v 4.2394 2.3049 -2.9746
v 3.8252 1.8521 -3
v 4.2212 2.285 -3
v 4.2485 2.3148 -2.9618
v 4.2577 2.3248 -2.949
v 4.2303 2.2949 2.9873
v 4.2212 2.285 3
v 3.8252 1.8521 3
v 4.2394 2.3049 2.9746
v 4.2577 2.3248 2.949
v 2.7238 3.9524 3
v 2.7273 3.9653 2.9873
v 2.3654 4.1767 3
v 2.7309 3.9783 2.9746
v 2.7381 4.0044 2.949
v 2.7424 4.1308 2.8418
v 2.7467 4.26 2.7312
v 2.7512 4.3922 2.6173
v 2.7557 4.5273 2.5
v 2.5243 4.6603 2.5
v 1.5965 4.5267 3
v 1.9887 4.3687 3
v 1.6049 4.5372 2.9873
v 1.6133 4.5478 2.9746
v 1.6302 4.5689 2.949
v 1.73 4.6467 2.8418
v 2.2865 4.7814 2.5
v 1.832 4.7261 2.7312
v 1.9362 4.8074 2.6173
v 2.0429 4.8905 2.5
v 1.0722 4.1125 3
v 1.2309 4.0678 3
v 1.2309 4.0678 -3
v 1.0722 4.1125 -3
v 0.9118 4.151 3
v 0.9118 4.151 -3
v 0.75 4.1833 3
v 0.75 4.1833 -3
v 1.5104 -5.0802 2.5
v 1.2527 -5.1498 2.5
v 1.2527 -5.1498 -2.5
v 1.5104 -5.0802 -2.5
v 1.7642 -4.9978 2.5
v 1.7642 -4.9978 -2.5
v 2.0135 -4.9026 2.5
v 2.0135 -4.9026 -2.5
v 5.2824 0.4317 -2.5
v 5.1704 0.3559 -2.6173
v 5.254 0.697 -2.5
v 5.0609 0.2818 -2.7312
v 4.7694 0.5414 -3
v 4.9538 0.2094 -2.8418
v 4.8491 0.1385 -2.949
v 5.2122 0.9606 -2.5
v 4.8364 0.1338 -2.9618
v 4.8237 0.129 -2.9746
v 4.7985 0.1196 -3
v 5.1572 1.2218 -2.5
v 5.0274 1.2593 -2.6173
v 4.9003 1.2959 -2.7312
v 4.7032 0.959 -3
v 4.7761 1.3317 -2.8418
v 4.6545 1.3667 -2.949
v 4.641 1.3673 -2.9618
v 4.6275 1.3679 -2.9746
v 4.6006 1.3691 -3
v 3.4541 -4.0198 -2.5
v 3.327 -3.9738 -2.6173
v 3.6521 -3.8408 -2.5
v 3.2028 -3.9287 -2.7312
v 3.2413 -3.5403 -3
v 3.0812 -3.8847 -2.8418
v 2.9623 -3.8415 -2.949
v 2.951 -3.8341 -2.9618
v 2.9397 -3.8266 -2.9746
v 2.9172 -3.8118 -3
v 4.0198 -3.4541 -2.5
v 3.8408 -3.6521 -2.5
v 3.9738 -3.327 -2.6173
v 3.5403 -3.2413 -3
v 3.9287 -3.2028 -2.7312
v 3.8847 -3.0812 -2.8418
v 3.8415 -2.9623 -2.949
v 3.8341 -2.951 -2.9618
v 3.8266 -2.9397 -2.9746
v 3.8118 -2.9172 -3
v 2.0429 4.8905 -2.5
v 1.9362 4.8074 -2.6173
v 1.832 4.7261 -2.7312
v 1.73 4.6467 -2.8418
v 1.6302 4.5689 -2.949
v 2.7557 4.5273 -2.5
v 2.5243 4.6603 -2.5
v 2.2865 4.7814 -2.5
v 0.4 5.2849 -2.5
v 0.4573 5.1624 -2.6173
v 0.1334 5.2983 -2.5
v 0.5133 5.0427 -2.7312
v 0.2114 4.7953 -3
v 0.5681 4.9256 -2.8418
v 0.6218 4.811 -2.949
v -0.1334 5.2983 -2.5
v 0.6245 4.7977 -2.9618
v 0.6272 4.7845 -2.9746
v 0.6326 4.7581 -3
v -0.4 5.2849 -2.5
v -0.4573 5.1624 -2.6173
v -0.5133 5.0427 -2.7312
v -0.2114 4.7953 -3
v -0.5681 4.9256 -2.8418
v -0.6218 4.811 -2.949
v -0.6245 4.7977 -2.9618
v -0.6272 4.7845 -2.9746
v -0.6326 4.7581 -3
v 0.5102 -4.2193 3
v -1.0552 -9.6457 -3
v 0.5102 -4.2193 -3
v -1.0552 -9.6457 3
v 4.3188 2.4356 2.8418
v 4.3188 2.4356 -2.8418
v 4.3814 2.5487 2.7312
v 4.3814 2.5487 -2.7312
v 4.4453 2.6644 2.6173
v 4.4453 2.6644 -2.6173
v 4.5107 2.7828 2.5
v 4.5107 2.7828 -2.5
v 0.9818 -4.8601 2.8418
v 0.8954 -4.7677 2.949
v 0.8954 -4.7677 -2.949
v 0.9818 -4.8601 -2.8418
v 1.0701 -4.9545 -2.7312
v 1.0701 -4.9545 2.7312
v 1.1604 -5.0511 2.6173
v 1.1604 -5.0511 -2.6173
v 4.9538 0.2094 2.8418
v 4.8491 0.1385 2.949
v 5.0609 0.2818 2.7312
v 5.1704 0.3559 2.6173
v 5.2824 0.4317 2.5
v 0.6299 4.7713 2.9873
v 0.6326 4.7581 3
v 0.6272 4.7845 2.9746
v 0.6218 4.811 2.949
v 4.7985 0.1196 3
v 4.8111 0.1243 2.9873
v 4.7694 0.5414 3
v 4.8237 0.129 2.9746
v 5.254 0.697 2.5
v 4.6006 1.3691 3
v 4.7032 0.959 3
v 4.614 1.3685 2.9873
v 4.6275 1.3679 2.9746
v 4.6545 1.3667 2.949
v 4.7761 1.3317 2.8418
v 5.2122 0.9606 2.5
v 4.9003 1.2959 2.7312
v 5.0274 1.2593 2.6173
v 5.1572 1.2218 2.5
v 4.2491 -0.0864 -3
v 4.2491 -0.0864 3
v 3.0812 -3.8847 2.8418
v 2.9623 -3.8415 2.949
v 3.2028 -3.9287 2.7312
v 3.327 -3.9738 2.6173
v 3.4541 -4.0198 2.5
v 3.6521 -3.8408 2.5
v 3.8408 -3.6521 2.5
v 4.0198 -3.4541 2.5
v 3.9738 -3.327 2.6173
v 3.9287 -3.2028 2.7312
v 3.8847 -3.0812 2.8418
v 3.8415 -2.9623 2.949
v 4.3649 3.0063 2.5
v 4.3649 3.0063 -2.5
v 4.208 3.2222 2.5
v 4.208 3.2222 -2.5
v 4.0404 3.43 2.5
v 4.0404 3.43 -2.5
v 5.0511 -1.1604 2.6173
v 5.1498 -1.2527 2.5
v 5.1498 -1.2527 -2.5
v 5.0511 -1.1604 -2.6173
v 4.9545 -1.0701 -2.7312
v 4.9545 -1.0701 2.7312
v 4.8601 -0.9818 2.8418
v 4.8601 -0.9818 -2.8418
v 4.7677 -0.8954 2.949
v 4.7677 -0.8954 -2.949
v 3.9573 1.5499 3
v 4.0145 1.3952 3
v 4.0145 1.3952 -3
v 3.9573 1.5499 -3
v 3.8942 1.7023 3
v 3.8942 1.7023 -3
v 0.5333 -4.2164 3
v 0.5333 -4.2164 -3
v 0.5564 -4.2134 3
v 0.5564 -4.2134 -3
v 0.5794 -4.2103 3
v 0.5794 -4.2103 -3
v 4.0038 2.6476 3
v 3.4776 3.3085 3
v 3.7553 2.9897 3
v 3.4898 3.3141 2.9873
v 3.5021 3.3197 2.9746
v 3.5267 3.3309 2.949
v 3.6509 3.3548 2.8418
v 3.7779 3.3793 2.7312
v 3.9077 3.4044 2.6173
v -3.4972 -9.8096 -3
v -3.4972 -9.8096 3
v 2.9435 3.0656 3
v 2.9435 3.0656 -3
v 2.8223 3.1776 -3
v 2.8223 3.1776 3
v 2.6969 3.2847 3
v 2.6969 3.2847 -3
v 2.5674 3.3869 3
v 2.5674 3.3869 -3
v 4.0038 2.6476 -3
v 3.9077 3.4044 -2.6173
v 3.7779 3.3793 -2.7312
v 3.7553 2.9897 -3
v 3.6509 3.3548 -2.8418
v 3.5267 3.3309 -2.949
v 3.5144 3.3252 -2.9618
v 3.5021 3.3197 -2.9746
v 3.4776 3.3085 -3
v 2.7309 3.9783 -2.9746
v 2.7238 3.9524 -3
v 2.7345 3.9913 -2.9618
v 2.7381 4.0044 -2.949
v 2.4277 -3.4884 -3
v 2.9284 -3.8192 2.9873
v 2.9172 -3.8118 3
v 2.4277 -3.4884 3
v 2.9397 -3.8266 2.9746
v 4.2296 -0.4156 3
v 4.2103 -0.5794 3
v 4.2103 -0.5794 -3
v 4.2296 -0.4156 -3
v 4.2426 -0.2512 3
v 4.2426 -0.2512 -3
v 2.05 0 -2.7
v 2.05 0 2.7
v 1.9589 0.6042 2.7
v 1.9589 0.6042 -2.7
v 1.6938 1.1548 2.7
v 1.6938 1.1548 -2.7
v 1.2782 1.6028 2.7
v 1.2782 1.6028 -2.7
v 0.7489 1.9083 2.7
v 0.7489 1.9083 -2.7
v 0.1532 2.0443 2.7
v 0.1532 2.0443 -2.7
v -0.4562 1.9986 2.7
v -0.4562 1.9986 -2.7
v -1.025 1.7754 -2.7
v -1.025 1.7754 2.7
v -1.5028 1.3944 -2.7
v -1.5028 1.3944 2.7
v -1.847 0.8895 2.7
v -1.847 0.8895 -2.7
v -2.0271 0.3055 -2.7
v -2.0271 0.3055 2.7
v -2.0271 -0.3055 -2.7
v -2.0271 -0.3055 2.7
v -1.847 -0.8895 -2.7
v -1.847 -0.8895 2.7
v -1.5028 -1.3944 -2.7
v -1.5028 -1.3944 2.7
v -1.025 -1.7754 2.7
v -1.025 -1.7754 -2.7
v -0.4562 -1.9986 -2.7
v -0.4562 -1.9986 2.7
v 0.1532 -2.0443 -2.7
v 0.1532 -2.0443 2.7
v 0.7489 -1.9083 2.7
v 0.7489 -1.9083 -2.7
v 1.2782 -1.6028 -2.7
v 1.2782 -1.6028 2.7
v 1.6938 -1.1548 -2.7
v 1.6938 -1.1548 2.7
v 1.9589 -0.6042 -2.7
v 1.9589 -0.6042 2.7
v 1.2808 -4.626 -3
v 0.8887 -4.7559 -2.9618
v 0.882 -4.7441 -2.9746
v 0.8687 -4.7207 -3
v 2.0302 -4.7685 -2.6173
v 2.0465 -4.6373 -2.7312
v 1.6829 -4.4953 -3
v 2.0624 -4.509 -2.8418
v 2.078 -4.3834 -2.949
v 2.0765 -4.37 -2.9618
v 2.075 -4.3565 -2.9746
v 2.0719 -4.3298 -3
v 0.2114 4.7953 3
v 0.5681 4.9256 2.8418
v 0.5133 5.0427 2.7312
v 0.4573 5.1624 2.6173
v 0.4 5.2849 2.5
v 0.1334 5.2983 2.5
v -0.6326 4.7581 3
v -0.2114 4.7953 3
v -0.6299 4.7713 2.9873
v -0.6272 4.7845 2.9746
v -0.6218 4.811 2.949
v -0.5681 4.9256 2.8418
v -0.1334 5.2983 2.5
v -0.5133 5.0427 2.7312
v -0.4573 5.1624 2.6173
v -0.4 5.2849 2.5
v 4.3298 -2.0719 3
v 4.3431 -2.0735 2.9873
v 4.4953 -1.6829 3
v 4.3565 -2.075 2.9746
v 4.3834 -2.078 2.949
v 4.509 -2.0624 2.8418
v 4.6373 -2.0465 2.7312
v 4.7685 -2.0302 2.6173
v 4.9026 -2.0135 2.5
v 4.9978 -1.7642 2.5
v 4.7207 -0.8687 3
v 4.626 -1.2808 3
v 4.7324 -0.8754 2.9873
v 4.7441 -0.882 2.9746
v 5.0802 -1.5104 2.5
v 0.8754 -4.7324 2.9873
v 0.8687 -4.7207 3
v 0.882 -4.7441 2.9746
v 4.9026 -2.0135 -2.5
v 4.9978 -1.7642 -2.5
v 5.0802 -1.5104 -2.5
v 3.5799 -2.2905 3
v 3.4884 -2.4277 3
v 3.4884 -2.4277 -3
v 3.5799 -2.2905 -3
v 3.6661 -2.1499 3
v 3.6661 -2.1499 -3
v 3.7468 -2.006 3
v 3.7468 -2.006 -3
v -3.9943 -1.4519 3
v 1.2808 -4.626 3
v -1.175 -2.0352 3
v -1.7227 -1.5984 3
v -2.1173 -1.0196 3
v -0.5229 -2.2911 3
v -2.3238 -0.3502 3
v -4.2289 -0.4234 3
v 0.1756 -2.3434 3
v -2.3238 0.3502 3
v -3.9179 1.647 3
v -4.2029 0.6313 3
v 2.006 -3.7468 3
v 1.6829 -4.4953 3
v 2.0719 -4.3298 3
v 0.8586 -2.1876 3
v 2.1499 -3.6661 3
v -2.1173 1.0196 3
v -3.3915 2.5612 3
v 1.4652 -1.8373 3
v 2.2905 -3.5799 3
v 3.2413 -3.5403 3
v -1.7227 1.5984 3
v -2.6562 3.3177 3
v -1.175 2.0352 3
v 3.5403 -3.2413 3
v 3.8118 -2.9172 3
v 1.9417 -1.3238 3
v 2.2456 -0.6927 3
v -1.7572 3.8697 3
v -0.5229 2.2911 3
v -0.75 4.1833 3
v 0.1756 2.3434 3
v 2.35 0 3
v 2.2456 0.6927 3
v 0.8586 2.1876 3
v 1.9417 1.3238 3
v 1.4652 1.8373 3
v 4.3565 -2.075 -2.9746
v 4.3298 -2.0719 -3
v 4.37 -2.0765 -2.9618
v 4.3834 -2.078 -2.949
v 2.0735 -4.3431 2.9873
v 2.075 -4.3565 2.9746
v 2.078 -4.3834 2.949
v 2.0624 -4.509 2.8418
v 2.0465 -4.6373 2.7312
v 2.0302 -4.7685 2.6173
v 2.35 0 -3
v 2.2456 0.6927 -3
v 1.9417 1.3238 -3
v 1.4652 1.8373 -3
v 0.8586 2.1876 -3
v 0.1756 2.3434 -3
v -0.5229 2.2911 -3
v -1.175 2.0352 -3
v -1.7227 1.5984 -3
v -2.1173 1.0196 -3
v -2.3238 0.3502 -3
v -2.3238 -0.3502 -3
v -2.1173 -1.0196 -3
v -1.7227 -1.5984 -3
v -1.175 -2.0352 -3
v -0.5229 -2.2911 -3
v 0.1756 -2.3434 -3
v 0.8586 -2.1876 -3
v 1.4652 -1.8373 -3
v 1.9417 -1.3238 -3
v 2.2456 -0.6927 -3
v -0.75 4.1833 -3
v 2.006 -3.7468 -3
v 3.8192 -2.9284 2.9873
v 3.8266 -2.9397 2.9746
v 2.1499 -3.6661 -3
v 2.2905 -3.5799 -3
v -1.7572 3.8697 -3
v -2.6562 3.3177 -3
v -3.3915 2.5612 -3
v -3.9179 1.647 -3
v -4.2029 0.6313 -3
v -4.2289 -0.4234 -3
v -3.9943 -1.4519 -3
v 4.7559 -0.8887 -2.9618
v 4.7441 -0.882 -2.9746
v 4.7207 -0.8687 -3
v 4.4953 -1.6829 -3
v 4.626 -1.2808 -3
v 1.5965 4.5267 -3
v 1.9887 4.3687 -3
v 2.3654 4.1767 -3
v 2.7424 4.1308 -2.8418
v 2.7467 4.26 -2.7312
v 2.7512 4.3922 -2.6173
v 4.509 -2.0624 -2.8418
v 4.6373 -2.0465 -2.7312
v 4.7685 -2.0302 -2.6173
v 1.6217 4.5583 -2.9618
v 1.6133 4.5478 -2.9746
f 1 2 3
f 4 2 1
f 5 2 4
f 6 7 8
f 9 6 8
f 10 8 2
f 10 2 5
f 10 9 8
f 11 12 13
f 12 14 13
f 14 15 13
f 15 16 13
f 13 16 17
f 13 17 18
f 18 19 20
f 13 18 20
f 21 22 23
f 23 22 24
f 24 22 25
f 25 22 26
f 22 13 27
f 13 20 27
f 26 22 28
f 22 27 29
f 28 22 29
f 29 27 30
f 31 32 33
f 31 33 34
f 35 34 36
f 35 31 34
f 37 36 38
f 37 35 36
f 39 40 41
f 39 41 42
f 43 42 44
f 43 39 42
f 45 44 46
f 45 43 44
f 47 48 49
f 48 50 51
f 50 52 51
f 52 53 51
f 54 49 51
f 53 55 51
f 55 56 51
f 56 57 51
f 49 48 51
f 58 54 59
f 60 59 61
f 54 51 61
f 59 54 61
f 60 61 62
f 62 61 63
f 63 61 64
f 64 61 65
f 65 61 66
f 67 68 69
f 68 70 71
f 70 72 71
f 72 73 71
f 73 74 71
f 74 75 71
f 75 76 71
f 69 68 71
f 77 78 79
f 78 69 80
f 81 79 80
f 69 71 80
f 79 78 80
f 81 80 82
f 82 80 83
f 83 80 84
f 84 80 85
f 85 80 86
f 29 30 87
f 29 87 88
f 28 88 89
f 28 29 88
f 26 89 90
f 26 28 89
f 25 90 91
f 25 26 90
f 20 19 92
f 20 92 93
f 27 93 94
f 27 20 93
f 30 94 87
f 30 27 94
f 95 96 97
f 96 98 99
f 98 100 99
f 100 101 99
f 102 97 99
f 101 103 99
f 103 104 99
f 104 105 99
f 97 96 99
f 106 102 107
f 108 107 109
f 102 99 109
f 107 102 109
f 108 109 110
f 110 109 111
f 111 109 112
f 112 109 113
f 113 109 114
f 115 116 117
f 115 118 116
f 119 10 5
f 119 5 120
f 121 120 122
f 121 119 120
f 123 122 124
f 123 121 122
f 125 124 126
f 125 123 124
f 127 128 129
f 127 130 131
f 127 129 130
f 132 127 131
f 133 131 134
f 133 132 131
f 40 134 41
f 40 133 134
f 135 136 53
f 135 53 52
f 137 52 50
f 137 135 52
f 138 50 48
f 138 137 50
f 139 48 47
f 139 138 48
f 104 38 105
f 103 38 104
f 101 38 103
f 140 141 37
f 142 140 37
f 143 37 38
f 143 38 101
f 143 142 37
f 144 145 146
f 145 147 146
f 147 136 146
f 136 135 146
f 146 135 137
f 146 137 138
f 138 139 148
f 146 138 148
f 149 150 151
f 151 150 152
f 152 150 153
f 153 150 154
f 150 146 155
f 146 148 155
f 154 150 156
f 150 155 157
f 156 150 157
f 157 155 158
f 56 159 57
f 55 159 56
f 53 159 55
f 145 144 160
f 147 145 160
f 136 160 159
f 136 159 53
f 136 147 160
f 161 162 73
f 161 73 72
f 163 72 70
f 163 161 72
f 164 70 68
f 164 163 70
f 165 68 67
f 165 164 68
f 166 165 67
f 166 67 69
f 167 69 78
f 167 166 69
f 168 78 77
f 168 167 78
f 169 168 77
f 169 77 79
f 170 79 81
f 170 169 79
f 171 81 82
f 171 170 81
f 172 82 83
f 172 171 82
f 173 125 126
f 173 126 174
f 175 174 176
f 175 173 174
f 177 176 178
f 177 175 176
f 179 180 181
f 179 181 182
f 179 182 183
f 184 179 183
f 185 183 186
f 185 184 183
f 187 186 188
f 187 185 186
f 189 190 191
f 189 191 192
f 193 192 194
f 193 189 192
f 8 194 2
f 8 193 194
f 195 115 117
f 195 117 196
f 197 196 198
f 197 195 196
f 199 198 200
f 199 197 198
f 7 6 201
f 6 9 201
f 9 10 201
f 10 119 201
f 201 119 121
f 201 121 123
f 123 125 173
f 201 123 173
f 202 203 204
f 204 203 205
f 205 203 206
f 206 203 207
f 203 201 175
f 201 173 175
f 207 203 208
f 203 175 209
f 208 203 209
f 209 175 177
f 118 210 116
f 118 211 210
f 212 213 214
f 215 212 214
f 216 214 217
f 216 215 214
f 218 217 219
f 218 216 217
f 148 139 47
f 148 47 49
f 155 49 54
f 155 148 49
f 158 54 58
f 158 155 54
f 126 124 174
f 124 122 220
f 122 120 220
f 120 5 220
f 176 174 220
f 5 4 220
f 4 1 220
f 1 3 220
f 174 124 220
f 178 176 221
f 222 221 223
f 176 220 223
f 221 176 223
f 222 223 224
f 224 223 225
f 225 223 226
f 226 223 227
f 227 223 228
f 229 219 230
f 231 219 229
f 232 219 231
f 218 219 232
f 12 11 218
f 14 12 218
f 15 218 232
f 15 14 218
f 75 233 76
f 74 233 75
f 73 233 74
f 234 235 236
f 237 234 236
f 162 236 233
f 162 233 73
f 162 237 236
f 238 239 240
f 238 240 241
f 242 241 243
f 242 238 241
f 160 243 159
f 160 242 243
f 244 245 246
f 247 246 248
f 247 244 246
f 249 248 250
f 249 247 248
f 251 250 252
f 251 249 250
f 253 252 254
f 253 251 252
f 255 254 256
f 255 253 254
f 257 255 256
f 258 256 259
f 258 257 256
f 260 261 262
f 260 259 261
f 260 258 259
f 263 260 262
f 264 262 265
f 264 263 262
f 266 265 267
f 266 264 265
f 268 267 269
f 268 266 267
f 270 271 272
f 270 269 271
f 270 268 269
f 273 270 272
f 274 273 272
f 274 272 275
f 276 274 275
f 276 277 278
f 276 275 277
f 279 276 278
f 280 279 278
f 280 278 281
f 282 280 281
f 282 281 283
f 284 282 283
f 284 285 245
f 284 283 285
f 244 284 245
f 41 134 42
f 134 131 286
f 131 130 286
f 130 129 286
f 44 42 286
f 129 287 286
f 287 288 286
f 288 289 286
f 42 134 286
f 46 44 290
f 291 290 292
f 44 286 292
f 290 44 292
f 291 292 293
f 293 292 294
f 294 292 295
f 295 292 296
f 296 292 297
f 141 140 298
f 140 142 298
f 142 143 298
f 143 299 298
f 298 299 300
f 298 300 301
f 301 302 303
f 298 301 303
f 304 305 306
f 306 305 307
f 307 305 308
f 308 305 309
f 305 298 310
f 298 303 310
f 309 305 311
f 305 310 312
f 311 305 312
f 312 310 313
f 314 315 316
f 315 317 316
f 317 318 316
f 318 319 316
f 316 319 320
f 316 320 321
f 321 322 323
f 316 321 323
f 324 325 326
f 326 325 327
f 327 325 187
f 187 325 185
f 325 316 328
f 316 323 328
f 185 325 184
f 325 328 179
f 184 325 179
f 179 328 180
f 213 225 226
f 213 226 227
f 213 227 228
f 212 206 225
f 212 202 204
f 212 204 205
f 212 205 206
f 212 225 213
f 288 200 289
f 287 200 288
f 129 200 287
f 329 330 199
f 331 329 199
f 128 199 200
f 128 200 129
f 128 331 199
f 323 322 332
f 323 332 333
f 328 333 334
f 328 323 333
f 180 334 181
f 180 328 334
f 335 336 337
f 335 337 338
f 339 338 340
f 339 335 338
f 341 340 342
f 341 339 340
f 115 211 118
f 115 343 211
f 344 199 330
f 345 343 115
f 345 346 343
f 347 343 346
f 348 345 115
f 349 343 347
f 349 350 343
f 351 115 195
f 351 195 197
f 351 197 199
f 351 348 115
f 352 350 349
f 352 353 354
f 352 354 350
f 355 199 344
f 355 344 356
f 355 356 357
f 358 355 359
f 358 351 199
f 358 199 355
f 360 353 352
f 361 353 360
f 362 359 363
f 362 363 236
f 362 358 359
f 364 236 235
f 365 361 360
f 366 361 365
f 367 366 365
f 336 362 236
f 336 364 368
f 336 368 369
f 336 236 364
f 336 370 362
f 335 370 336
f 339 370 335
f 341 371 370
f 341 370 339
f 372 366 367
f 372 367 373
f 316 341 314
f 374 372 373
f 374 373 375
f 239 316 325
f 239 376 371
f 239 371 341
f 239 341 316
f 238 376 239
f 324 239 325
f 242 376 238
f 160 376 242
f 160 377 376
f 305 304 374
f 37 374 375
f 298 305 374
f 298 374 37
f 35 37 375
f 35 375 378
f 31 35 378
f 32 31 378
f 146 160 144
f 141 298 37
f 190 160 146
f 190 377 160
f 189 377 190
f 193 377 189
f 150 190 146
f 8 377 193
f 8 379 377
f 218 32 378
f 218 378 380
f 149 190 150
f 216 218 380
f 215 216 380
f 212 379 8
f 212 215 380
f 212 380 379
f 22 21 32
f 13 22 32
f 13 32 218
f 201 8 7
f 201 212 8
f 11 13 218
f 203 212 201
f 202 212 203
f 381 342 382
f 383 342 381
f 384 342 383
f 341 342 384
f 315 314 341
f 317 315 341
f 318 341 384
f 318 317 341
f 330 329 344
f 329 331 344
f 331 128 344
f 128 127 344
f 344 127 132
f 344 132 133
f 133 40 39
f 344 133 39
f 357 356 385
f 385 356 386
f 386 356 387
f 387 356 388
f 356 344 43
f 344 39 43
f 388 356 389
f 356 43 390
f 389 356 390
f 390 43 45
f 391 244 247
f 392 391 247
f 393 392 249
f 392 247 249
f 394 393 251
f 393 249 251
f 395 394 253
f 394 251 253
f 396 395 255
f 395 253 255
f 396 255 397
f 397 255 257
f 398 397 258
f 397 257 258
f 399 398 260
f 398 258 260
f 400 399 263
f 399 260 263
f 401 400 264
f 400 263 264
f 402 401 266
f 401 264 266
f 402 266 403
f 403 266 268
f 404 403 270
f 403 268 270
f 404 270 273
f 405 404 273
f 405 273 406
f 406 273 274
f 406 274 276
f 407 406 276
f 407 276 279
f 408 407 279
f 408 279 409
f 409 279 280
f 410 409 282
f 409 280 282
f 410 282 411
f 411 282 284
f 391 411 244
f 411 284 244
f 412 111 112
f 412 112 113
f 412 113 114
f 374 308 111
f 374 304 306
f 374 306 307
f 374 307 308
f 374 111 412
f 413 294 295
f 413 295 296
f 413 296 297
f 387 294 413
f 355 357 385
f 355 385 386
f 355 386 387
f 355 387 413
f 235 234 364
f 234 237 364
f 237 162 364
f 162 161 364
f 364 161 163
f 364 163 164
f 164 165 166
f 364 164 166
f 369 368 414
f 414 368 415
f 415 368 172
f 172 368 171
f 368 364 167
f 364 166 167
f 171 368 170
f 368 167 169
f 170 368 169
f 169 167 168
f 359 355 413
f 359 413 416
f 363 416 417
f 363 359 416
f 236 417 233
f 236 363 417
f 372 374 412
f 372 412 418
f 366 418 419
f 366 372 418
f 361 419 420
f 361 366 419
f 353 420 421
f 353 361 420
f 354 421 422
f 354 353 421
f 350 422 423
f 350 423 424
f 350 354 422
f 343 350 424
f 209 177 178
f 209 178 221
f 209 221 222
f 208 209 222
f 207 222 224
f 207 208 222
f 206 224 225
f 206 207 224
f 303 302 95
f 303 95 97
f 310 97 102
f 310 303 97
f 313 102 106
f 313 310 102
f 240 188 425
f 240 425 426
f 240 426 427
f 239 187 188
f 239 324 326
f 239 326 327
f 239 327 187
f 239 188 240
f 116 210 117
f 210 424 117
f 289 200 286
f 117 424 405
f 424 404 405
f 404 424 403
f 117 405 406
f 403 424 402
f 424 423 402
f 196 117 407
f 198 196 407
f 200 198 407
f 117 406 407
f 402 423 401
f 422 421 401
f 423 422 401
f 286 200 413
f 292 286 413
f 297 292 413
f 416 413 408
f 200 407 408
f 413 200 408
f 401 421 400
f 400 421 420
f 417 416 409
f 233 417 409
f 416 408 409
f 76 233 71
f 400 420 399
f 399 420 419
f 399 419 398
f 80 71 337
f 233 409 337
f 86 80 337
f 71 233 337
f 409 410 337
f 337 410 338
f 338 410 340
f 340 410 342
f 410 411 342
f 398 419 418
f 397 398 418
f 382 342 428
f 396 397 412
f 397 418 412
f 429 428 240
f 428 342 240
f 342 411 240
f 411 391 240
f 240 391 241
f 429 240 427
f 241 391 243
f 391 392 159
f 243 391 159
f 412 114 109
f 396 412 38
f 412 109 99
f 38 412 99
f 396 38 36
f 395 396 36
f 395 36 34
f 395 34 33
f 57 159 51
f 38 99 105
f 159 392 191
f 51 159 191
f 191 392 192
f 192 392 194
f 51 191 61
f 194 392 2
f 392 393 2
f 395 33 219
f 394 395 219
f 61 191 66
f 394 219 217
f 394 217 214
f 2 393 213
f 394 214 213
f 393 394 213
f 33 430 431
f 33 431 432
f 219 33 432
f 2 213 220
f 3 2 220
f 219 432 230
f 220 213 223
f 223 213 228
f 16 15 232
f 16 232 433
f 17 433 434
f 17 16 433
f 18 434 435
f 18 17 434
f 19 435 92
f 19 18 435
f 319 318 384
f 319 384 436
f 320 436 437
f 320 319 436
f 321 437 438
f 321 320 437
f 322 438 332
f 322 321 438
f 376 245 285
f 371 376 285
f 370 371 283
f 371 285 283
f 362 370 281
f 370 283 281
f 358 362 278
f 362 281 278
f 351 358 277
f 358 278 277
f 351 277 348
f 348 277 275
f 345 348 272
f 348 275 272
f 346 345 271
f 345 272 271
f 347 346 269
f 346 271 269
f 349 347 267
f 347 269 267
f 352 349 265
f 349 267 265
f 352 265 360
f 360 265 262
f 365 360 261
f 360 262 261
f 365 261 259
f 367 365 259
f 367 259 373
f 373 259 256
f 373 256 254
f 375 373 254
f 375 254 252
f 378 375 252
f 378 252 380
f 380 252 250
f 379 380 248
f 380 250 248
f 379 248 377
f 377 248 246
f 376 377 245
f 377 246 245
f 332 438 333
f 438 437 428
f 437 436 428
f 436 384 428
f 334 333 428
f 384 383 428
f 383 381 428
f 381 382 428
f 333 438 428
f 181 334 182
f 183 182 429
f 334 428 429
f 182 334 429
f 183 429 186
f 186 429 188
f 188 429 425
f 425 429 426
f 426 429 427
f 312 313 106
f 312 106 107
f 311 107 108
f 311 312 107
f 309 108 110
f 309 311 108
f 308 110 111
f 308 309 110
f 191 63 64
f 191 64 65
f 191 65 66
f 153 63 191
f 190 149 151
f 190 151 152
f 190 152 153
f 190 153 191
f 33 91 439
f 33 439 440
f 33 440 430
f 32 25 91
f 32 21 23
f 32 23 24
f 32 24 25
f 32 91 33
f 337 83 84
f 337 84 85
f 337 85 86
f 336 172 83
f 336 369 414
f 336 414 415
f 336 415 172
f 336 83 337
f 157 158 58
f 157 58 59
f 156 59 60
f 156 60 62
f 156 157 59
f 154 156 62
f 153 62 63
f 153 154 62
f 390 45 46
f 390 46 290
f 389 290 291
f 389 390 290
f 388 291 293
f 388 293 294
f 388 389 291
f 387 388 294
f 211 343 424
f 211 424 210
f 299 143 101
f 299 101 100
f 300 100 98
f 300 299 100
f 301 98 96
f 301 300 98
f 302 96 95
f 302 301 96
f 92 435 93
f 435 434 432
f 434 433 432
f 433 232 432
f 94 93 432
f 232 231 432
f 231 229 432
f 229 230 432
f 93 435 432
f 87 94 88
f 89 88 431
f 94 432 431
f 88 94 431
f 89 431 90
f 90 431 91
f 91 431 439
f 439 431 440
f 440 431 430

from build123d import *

# Parameters (mm, degrees)
SKETCH_1_R               = 2.05
EXTRUDE_1_DEPTH          = 3
PATTERN_CIRCULAR_1_COUNT = 7
PATTERN_CIRCULAR_1_ANGLE = 162
CHAMFER_1_SIZE           = 0.5
CHAMFER_2_SIZE           = 0.5
CHAMFER_3_SIZE           = 0.3
EXTRUDE_2_DEPTH          = 3


with BuildPart() as part:
    # 스케치1 → 보스-돌출1 (new, symmetric)
    with BuildSketch(Plane.XY):
        with BuildLine():
            ThreePointArc((-0.75, 4.183300133), (0, -4.25), (0.75, 4.183300133))
            Line((0.75, 4.183300133), (0.621752267, 4.811019676))
            Line((0.621752267, 4.811019676), (0.4, 5.284884105))
            ThreePointArc((0.4, 5.284884105), (0, 5.3), (-0.4, 5.284884105))
            Line((-0.4, 5.284884105), (-0.621752267, 4.811019676))
            Line((-0.621752267, 4.811019676), (-0.75, 4.183300133))
        make_face()
        Circle(SKETCH_1_R, mode=Mode.SUBTRACT)
    extrude_1 = extrude(amount=EXTRUDE_1_DEPTH, both=True)

    # 원형 패턴1: 보스-돌출1 ×7 about axis
    pattern_circular_1_axis = Axis((0, 0, 0), (0, 0, -1))
    for i in range(1, PATTERN_CIRCULAR_1_COUNT):
        add(extrude_1.rotate(pattern_circular_1_axis, i * PATTERN_CIRCULAR_1_ANGLE / (PATTERN_CIRCULAR_1_COUNT - 1)))

    # 모따기1
    chamfer_1_edges = [part.edges().sort_by_distance(p)[0] for p in [
        (0, 5.3, -3),
        (1.63779007, -5.040599536, -3),
        (3.74766594, -3.74766594, -3),
        (5.040599536, -1.63779007, -3),
        (5.234748205, 0.829102665, -3),
        (4.28779007, 3.115261837, -3),
        (2.406149649, 4.722334578, -3),
    ]]
    chamfer(chamfer_1_edges, length=CHAMFER_1_SIZE)

    # 모따기2
    chamfer_2_edges = [part.edges().sort_by_distance(p)[0] for p in [
        (0, 5.3, 3),
        (2.406149649, 4.722334578, 3),
        (4.28779007, 3.115261837, 3),
        (5.234748205, 0.829102665, 3),
        (5.040599536, -1.63779007, 3),
        (3.74766594, -3.74766594, 3),
        (1.63779007, -5.040599536, 3),
    ]]
    chamfer(chamfer_2_edges, length=CHAMFER_2_SIZE)

    # 모따기3
    chamfer_3_edges = [part.edges().sort_by_distance(p)[0] for p in [
        (-2.05, 0, 3),
        (-2.05, 0, -3),
    ]]
    chamfer(chamfer_3_edges, length=CHAMFER_3_SIZE)

    # 스케치4 → 보스-돌출2 (add, symmetric)
    with BuildSketch(Plane.XY):
        Polygon((-1.055150369, -9.645655488), (0.510208527, -4.219263829), (-3.994308358, -1.451895569), (-3.497178156, -9.809555456), align=None)
    extrude(amount=EXTRUDE_2_DEPTH, both=True)


solid = part.part
